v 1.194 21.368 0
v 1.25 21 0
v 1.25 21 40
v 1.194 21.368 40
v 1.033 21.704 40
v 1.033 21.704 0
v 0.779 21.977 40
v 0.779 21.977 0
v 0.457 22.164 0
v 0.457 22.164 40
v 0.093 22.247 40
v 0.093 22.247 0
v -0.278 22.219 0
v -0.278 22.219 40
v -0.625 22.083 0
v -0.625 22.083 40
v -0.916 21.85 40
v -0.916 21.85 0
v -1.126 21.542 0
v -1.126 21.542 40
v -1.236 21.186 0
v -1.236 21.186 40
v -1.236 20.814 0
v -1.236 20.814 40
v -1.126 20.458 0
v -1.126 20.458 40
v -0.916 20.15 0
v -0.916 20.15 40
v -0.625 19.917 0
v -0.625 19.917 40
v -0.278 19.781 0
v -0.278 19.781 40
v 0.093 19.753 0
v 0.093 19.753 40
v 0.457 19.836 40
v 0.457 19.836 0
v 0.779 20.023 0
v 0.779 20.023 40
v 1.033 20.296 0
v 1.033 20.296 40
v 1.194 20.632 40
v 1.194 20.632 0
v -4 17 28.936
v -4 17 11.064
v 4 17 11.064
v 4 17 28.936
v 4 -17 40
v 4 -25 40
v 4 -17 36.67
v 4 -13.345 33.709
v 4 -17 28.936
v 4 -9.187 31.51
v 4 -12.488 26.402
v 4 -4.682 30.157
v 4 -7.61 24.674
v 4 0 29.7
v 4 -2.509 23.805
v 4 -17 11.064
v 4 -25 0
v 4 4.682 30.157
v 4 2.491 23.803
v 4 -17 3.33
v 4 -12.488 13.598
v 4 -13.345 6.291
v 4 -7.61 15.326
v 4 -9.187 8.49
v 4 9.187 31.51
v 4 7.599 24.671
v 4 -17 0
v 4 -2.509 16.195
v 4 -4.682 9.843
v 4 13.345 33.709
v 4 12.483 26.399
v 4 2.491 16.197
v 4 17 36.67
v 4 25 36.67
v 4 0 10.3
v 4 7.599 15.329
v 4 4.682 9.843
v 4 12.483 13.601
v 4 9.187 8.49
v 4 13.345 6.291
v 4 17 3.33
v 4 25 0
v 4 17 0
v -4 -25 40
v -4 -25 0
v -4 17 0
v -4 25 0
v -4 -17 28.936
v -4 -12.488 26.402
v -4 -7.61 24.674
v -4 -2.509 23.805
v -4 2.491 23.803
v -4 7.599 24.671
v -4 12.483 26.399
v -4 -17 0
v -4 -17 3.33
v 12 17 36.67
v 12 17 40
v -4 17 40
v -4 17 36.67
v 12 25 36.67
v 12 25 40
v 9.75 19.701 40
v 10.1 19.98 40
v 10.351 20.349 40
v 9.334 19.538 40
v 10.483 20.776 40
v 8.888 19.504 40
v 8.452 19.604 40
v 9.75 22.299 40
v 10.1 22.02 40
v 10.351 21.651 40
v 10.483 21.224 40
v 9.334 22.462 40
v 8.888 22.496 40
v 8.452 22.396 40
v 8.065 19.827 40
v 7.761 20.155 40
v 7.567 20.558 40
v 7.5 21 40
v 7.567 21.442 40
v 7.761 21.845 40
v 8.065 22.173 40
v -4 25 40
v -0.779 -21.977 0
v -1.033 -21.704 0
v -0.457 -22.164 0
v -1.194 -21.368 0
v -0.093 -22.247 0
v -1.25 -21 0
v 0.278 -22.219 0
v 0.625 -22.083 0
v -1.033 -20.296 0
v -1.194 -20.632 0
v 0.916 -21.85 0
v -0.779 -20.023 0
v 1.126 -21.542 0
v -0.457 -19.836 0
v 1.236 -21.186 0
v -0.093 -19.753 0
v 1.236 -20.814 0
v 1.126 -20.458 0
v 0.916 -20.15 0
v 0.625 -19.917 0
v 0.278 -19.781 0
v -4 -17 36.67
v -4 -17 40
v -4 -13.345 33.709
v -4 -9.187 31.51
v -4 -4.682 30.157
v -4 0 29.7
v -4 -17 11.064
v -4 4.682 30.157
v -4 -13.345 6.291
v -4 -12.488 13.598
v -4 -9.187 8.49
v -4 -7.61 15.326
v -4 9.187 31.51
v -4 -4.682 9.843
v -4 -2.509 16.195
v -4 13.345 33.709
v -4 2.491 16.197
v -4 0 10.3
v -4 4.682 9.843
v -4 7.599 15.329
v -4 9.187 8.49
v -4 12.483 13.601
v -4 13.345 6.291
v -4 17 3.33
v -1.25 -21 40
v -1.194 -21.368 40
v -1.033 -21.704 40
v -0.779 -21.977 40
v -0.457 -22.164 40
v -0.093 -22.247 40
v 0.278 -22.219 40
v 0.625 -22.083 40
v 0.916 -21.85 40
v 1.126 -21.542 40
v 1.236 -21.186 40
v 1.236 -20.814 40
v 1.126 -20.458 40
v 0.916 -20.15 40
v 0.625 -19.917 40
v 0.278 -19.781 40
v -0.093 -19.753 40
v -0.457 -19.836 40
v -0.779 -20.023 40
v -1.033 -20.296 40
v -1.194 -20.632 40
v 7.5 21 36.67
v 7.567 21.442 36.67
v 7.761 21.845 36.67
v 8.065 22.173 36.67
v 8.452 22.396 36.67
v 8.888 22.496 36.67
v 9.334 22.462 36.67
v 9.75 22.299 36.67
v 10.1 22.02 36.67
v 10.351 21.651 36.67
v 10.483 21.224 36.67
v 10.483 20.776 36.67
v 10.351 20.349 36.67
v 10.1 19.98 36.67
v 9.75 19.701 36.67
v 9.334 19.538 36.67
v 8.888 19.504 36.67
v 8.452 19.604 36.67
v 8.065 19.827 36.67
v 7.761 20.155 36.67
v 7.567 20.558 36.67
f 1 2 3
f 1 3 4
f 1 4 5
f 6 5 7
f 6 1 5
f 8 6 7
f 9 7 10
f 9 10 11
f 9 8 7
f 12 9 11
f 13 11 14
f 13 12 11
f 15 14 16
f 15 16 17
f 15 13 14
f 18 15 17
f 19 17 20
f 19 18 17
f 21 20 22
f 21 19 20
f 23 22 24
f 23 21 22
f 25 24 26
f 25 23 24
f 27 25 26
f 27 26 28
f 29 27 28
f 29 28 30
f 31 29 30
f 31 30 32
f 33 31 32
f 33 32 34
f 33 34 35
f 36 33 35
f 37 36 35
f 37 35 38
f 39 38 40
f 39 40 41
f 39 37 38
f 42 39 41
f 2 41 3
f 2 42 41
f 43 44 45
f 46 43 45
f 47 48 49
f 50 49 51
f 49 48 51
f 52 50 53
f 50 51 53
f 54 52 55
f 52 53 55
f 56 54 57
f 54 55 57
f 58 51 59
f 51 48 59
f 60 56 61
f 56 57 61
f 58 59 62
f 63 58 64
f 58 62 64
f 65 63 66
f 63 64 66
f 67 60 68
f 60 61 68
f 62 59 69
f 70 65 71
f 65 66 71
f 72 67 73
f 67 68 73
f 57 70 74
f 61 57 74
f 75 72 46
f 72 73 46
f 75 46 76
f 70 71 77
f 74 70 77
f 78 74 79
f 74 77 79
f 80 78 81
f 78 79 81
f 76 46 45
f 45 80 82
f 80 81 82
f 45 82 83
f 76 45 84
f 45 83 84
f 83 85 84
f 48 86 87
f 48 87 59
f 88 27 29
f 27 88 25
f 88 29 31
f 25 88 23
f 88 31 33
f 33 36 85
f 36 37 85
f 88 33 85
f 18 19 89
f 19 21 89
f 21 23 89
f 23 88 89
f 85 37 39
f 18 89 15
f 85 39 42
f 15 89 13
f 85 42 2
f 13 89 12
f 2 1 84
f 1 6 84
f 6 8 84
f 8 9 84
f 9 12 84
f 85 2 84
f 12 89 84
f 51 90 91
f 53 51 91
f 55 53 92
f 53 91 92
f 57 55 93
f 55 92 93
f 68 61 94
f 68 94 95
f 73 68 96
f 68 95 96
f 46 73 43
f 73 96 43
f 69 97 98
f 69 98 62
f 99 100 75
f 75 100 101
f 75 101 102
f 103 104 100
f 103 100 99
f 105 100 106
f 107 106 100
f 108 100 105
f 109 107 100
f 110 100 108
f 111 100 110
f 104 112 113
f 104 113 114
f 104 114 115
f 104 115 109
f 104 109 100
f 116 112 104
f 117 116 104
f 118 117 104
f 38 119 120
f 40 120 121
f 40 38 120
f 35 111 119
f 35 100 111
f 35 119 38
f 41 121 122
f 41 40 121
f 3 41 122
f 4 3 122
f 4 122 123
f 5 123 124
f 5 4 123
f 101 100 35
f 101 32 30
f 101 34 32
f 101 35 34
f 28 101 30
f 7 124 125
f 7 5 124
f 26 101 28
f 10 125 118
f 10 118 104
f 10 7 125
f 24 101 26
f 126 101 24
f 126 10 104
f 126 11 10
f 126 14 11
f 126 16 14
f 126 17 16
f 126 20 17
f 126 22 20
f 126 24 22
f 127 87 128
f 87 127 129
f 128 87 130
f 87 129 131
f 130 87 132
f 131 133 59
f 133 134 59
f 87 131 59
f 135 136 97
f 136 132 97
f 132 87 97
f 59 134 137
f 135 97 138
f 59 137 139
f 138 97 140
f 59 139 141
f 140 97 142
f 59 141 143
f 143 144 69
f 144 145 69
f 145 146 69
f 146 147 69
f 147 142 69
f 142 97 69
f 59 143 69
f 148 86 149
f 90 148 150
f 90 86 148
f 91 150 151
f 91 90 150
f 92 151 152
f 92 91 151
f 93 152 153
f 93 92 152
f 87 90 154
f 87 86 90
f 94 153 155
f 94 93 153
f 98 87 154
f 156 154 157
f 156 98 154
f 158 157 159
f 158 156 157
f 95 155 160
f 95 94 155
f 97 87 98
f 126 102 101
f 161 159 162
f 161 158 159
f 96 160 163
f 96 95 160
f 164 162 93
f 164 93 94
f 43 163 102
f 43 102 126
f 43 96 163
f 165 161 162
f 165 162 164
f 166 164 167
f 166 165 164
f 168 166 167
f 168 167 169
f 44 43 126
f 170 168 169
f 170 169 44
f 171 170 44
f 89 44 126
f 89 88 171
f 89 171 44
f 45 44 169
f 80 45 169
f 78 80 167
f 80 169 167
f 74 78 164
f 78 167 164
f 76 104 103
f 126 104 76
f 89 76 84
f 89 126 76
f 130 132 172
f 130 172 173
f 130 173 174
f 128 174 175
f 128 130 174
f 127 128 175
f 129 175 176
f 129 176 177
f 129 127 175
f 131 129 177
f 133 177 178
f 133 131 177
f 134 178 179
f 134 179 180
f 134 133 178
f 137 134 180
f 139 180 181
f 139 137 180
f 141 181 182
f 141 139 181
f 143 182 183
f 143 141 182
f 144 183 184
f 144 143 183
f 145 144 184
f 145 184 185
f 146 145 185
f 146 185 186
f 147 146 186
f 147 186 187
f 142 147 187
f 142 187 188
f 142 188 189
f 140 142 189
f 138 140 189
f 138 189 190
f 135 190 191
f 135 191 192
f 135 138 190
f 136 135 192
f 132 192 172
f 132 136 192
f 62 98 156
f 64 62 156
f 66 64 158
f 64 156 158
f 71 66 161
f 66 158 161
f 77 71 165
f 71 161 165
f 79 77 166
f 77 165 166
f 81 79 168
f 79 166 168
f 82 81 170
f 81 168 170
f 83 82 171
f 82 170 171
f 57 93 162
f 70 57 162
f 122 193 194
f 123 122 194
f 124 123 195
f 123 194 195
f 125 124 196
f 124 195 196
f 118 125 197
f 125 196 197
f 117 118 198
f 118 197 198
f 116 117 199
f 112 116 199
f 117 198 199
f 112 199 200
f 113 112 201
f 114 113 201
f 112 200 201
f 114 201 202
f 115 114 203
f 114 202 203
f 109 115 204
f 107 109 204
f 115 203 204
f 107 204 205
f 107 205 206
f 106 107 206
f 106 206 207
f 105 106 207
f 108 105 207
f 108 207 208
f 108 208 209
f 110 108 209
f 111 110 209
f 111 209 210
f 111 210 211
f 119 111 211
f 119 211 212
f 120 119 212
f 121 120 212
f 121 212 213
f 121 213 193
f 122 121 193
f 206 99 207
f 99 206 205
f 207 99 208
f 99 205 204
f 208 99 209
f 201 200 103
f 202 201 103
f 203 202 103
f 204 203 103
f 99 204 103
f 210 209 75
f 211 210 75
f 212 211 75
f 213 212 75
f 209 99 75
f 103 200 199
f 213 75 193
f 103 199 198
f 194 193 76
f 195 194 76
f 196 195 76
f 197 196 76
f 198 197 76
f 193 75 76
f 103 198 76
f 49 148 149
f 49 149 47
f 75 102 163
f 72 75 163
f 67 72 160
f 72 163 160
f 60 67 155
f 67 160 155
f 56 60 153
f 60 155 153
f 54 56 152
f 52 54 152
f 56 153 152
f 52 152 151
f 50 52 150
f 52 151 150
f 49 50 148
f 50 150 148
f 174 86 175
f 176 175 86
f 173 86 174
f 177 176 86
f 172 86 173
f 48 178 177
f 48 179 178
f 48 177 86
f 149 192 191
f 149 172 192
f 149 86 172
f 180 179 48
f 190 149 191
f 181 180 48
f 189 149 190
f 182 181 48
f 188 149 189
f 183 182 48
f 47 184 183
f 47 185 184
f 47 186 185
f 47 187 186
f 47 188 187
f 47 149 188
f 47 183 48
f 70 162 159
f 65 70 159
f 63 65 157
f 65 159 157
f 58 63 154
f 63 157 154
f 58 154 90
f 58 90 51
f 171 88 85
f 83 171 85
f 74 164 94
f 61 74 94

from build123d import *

# Parameters (mm, degrees)
SKETCH1_W             = 8
SKETCH1_H             = 8
SKETCH1_R             = 1.25
BOSS_EXTRUDE1_DEPTH   = 40
BOSS_EXTRUDE1_2_DEPTH = 40
BOSS_EXTRUDE2_DEPTH   = 8
SKETCH3_W             = 3.329640508
SKETCH3_H             = 8
BOSS_EXTRUDE3_DEPTH   = 8
SKETCH4_R             = 1.5
CUT_EXTRUDE1_DEPTH    = 6


with BuildPart() as part:
    # Sketch1 → Boss-Extrude1 (new body)
    with BuildSketch(Plane.XY):
        with Locations((0, 21)):
            Rectangle(SKETCH1_W, SKETCH1_H)
        with Locations((0, 21)):
            Circle(SKETCH1_R, mode=Mode.SUBTRACT)
    extrude(amount=BOSS_EXTRUDE1_DEPTH)



with BuildPart() as body_2:
    # Sketch1 → Boss-Extrude1 2 (new body)
    with BuildSketch(Plane.XY):
        with Locations((0, -21)):
            Rectangle(SKETCH1_W, SKETCH1_H)
        with Locations(Location((0, -21, 0), (0, 0, 180))):
            Circle(SKETCH1_R, mode=Mode.SUBTRACT)
    extrude(amount=BOSS_EXTRUDE1_2_DEPTH)


with BuildPart() as part_1:
    add(part.part)

    add(body_2.part)  # Boss-Extrude2 merges body 2
    # Sketch2 → Boss-Extrude2 (add)
    with BuildSketch(Plane.ZY.offset(4)):
        with BuildLine():
            Line((3.329640508, 17), (11.063985021, 17))
            ThreePointArc((11.063985021, 17), (14.56966913, 10.077818269), (16.196928044, 2.491089763))
            Line((16.196928044, 2.491089763), (23.803071956, 2.491089763))
            ThreePointArc((23.803071956, 2.491089763), (25.43033087, 10.077818269), (28.936014979, 17))
            Line((28.936014979, 17), (36.670359492, 17))
            ThreePointArc((36.670359492, 17), (29.700211914, 0), (36.670359492, -17))
            Line((36.670359492, -17), (28.936014979, -17))
            ThreePointArc((28.936014979, -17), (25.433314102, -10.086246784), (23.804551435, -2.508910237))
            Line((23.804551435, -2.508910237), (16.195448565, -2.508910237))
            ThreePointArc((16.195448565, -2.508910237), (14.566685898, -10.086246784), (11.063985021, -17))
            Line((11.063985021, -17), (3.329640508, -17))
            ThreePointArc((3.329640508, -17), (10.299788086, 0), (3.329640508, 17))
        make_face()
    extrude(amount=-BOSS_EXTRUDE2_DEPTH)

    # Sketch3 → Boss-Extrude3 (add)
    with BuildSketch(Plane(origin=(4, 0, 0), x_dir=(0, 0, -1), z_dir=(1, 0, 0))):
        with Locations((-38.335179746, 21)):
            Rectangle(SKETCH3_W, SKETCH3_H)
    extrude(amount=BOSS_EXTRUDE3_DEPTH)

    # Sketch4 → Cut-Extrude1 (cut)
    with BuildSketch(Plane(origin=(0, 0, 36.670359492), x_dir=(-1, 0, 0), z_dir=(0, 0, -1))):
        with Locations((-9, 21)):
            Circle(SKETCH4_R)
    extrude(amount=-CUT_EXTRUDE1_DEPTH, mode=Mode.SUBTRACT)


solid = part_1.part
